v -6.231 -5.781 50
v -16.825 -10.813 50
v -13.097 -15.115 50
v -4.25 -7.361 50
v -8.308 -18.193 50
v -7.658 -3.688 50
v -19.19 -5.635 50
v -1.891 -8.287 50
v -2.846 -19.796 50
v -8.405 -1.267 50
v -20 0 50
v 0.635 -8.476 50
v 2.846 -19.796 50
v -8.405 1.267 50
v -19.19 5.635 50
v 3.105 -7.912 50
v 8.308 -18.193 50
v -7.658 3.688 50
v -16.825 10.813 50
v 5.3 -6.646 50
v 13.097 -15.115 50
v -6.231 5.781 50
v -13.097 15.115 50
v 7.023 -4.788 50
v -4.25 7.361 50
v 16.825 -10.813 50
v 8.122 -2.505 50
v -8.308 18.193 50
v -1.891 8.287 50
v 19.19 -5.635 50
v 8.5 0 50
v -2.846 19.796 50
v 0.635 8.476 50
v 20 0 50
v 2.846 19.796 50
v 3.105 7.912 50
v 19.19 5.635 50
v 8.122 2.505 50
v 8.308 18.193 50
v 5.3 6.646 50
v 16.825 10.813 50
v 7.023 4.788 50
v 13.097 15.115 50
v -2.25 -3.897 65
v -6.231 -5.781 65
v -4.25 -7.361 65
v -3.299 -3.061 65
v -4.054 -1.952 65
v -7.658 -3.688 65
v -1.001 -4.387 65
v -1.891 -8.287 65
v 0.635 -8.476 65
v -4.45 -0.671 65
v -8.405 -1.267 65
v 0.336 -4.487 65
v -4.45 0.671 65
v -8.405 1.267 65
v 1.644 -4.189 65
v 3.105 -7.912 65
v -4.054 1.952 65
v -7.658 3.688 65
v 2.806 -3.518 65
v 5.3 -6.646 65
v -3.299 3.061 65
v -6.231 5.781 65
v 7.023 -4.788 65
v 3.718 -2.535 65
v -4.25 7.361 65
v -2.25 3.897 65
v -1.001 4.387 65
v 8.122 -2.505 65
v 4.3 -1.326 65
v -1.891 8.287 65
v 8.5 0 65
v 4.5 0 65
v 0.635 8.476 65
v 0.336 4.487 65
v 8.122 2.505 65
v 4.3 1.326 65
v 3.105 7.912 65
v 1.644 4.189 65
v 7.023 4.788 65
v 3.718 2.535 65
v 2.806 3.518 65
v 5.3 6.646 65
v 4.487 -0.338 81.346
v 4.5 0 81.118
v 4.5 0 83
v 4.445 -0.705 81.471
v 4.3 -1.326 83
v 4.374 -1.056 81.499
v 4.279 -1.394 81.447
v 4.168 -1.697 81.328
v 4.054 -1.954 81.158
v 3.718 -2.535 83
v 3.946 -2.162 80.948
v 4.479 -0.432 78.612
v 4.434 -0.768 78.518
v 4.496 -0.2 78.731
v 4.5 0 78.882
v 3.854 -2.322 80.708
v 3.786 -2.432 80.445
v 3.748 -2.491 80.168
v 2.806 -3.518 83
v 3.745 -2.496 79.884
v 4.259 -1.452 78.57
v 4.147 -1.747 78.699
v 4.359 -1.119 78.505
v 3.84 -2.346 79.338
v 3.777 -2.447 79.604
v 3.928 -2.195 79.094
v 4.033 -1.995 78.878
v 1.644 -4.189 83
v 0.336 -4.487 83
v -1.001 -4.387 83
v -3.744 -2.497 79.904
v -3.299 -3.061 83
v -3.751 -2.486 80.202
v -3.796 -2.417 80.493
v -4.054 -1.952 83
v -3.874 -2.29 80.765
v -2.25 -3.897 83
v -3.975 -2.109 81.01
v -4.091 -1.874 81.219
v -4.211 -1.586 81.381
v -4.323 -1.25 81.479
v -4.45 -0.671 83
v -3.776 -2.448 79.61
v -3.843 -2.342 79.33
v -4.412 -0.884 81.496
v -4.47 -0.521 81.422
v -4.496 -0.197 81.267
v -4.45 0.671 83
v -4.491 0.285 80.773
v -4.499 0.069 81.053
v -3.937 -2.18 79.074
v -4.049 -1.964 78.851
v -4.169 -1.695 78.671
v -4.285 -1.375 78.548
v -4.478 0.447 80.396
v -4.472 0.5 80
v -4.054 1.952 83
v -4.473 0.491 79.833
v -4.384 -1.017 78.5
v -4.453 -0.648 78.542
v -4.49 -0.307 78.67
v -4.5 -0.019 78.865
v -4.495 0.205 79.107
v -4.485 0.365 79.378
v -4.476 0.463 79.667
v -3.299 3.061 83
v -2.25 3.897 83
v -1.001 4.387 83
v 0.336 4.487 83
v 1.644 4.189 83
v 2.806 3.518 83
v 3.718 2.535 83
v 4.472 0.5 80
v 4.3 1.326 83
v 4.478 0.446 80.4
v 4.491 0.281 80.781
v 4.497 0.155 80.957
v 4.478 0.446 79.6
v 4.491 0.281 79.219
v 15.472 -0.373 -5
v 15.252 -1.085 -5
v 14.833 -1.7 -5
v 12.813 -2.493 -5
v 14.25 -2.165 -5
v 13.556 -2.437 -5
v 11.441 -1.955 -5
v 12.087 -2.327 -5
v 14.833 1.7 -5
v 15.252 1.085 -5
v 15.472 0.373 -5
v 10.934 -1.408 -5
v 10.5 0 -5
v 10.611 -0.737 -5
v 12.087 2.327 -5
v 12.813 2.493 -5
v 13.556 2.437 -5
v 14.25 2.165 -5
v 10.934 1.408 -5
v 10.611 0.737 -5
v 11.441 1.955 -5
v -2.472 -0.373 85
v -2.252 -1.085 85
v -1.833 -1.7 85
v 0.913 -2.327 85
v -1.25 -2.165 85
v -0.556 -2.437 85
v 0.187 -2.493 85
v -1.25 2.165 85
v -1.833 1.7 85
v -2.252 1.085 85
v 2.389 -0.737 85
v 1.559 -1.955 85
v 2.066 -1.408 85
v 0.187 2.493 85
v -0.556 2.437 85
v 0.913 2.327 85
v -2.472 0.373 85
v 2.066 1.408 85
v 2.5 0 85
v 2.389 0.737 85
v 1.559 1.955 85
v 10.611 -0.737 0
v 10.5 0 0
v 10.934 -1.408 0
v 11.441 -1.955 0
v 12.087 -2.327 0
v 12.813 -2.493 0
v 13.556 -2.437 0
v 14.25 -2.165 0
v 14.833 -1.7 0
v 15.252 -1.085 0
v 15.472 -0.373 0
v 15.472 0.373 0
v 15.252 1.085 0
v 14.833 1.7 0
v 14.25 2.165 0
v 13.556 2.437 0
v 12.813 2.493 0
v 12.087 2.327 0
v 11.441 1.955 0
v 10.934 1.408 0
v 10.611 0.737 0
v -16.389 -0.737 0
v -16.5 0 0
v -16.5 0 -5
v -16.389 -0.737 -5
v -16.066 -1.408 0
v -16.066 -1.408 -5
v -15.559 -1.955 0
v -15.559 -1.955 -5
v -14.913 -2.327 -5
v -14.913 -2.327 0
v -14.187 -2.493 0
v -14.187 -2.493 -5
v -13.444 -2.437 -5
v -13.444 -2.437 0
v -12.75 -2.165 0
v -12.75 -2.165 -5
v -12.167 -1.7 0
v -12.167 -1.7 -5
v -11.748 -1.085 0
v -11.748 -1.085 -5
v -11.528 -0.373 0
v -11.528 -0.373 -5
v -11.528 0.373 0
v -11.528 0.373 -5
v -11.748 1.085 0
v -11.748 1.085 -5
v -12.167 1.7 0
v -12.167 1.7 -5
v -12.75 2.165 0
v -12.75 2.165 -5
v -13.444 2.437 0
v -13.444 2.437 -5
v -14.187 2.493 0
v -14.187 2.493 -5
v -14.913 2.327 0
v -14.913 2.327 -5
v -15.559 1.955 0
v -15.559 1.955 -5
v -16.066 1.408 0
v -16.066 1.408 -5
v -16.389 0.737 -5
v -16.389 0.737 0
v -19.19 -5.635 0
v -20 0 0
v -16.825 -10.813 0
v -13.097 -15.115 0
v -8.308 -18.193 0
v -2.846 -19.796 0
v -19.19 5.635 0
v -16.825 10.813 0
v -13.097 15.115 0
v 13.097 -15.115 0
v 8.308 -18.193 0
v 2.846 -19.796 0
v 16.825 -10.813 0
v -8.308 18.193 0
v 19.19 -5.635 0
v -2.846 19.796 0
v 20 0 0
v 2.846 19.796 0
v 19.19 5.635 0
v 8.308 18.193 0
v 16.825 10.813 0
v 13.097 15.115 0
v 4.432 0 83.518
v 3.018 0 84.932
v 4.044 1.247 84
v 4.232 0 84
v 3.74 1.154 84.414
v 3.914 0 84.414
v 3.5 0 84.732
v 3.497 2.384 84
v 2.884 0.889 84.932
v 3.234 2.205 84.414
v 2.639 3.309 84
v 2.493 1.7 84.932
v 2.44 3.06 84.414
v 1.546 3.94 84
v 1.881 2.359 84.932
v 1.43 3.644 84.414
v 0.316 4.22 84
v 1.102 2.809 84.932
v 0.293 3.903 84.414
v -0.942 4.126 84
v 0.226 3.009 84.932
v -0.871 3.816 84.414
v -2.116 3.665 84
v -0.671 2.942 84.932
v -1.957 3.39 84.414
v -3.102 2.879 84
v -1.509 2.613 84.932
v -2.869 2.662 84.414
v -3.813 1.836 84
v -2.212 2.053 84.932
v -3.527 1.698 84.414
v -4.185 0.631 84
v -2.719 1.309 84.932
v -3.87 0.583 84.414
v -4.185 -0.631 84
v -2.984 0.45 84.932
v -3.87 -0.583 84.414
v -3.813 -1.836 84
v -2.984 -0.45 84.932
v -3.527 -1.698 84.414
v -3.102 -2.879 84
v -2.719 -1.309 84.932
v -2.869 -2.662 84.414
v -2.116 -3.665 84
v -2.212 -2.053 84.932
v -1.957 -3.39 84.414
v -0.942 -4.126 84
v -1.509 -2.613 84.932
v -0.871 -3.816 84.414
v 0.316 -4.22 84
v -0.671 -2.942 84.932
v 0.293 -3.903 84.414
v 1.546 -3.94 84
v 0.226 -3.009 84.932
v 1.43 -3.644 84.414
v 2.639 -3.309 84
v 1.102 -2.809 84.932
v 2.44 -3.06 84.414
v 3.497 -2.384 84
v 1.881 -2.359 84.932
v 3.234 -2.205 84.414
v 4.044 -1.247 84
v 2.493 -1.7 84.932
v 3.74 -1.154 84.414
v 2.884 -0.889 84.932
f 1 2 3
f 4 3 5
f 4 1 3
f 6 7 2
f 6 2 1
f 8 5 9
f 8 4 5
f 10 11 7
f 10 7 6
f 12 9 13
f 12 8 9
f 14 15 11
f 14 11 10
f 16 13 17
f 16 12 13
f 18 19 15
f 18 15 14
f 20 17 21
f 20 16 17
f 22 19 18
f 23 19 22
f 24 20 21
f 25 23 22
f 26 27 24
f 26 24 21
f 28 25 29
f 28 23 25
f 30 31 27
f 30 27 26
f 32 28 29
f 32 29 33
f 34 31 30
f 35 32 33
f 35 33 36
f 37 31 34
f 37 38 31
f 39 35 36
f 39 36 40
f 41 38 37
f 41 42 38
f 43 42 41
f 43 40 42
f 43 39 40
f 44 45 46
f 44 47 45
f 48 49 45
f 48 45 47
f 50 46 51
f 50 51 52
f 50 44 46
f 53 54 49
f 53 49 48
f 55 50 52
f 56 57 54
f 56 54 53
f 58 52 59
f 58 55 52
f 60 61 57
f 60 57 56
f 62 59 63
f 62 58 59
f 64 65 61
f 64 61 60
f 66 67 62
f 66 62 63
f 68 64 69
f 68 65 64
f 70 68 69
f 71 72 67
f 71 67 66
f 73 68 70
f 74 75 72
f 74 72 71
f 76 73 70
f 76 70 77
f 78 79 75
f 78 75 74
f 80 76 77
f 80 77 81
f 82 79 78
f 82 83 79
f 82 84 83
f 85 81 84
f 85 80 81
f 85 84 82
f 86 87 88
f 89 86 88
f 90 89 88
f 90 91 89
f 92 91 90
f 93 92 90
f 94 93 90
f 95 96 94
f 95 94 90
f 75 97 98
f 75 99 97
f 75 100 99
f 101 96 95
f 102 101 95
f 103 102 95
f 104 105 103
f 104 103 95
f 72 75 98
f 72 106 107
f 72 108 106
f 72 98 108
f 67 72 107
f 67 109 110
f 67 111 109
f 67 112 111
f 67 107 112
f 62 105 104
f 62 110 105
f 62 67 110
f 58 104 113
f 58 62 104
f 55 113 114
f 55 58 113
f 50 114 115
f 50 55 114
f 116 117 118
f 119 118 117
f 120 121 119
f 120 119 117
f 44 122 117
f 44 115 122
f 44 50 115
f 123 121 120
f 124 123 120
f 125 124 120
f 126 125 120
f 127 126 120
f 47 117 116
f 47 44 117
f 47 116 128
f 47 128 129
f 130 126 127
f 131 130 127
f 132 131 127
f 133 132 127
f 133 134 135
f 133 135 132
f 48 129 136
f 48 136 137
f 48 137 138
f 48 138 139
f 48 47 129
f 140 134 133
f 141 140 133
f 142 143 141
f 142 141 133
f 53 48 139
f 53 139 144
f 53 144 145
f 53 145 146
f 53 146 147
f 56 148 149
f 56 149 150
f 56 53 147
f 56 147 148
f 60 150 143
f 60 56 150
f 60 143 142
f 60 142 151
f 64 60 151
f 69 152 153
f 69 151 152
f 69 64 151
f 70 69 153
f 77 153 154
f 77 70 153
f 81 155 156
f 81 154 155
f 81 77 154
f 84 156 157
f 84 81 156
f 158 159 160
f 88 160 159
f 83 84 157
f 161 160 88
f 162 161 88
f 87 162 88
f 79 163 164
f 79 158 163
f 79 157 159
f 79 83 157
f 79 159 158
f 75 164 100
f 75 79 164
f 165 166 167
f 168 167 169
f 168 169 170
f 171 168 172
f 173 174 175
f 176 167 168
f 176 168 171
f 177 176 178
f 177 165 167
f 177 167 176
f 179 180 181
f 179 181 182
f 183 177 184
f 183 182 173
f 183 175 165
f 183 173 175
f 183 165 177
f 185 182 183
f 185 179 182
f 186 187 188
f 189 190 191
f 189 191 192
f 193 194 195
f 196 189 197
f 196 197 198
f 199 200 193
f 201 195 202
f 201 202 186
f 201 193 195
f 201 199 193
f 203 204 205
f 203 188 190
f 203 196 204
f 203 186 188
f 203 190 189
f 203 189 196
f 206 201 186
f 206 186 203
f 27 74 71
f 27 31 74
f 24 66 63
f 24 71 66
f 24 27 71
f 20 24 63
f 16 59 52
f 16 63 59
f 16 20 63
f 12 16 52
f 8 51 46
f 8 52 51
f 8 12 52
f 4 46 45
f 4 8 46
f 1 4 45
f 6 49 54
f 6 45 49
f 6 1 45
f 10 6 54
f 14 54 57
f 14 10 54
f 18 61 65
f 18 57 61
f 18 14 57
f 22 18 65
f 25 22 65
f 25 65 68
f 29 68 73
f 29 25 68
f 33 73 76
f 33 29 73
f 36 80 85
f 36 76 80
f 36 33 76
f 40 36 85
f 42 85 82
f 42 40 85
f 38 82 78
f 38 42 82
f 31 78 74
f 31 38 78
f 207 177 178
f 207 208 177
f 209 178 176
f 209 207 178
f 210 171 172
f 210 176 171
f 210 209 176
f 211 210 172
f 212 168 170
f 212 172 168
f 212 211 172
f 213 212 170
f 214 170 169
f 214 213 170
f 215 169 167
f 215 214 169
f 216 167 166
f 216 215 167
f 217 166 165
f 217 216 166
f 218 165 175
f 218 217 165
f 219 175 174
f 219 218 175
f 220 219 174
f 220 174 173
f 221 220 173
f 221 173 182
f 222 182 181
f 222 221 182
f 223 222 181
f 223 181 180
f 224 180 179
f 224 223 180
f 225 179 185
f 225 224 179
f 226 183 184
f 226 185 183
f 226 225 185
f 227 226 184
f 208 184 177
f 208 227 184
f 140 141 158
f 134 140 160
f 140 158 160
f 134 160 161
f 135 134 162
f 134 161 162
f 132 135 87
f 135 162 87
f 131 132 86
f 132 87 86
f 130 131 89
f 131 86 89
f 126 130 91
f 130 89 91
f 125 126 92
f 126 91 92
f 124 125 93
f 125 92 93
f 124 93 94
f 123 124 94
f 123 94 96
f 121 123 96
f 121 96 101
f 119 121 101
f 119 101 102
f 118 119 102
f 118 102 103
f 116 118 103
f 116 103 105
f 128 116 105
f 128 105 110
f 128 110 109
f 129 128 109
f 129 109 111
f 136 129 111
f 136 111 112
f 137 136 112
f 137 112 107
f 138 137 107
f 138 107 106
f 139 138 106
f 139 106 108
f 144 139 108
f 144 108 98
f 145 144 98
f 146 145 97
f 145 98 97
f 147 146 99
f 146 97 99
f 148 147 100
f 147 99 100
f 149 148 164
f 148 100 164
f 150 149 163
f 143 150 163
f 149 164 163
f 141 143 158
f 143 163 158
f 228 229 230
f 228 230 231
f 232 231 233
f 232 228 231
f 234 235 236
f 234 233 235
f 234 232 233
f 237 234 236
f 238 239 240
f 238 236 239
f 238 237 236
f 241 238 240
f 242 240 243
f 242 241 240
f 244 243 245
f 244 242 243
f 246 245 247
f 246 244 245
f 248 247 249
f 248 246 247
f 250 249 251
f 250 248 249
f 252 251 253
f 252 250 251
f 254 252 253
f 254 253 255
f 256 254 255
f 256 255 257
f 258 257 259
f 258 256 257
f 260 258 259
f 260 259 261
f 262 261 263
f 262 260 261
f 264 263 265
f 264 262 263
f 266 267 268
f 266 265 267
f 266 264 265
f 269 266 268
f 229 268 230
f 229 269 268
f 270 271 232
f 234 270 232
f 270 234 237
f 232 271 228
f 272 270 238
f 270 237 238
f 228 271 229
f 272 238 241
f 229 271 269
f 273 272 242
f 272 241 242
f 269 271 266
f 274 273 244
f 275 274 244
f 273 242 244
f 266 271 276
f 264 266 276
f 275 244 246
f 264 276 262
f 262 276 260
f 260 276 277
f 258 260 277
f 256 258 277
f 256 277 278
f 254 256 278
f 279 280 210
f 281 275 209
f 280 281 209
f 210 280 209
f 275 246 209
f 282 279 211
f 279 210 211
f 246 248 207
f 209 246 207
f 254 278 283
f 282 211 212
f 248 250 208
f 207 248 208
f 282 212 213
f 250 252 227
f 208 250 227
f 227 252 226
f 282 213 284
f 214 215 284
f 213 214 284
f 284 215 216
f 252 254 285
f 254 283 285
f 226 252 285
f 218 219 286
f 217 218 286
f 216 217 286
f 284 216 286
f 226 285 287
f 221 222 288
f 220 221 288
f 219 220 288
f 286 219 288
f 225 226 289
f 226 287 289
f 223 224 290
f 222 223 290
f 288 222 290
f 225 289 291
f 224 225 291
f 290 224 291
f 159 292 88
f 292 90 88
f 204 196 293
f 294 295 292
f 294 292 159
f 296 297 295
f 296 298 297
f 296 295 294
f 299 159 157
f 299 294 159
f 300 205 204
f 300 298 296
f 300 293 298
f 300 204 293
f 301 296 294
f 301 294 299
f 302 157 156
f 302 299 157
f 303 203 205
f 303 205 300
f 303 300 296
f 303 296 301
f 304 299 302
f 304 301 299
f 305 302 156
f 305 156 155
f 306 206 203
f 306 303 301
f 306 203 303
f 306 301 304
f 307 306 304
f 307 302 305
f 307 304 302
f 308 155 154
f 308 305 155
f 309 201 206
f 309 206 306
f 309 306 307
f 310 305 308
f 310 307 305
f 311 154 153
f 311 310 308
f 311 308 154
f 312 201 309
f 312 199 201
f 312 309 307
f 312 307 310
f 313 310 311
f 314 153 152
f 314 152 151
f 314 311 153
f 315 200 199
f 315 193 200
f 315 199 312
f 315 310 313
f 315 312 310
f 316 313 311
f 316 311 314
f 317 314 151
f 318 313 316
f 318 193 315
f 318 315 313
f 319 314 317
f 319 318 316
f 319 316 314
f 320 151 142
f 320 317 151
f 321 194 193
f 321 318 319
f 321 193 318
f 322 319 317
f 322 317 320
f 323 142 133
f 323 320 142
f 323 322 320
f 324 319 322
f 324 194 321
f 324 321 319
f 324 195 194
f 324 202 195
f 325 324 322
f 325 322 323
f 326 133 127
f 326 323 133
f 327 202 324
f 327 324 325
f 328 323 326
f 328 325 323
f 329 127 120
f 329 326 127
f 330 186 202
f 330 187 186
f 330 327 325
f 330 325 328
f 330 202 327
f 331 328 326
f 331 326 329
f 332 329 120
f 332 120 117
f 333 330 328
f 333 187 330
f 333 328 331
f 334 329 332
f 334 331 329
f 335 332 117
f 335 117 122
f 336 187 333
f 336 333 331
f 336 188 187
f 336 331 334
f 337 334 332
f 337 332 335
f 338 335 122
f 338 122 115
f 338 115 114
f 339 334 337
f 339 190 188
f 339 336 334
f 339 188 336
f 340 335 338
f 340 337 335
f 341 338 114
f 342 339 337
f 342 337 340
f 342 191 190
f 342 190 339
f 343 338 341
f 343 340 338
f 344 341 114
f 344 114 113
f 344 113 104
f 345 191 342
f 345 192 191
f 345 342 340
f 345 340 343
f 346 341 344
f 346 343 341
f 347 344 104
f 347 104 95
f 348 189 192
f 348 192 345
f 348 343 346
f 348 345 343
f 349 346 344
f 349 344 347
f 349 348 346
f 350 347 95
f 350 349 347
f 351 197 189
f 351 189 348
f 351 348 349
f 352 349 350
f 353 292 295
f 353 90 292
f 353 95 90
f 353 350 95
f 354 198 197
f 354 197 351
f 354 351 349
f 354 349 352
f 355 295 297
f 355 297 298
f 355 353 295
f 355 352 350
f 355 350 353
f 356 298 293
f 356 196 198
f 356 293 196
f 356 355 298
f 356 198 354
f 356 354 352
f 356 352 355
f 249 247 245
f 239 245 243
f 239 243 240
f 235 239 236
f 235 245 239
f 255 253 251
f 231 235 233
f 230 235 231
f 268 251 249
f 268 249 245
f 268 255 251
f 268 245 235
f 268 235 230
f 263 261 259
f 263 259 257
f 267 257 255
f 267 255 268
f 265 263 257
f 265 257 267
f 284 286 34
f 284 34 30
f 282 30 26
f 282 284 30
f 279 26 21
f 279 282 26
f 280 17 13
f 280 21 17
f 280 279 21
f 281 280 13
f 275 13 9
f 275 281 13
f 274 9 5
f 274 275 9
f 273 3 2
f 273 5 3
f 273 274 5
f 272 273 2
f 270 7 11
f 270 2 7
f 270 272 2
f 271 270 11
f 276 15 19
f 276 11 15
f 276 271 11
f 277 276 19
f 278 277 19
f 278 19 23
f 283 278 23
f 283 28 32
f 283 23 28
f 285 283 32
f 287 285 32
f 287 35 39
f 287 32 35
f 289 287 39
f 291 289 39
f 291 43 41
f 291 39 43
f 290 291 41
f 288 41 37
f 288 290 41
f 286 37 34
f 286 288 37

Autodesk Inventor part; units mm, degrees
ref_plane "YZ Plane" through (0, 0, 0) normal (1, 0, 0) x (0, 1, 0)
ref_plane "XZ Plane" through (0, 0, 0) normal (0, 1, 0) x (-1, 0, 0)
ref_plane "XY Plane" through (0, 0, 0) normal (0, 0, 1) x (1, 0, 0)
sketch "Sketch1" plane through (0, 0, 0) normal (0, 0, 1) x (1, 0, 0)
  circle A0 centre (0, 0) radius 20
  dimension "d0" = 40
extrude "Extrusion1" add sketch "Sketch1" along normal blind 50
sketch "Sketch2" plane through (0, 0, 50) normal (0, 0, 1) x (1, 0, 0)
  circle A0 centre (0, 0) radius 8.5
  dimension "d3" = 17
extrude "Extrusion2" add sketch "Sketch2" along normal blind 15
thread "Thread1" size "M17x1.5" class "6g" standard "ANSI Metric M Profile" full length
sketch "Sketch3" plane through (0, 0, 65) normal (0, 0, 1) x (1, 0, 0)
  circle A0 centre (0, 0) radius 4.5
  dimension "d8" = 9
extrude "Extrusion3" add sketch "Sketch3" along normal blind 20
sketch "Sketch4" plane through (0, 0, 0) normal (1, 0, 0) x (0, 1, 0)
  line L0 (4.5, 85) -> (-4.5, 85) projected
  line L1 (0, 85) -> (0, 80)
  circle A0 centre (0, 80) radius 1
  circle A1 centre (-1, 80) radius 1.5
  point P0 (0, 0)
  dimension "d11" = 5
  dimension "d12" = 3
extrude "Extrusion4" cut sketch "Sketch4" along normal through all both and the other way through all contours A1 A0 L1 | L1 A0 A1 | A0 A1 picked at (0.0001, 79.7835)
fillet "Fillet1" radius 2 1 edges at (-4.5, 0, 85)
sketch "Sketch5" plane through (0, 0, 0) normal (0, 0, -1) x (-1, 0, 0)
  circle A0 centre (14, 0) radius 2.5
  circle A1 centre (-13, 0) radius 2.5
  point P0 (0, 0)
  dimension "d16" = 5
  dimension "d17" = 5
extrude "Extrusion5" add sketch "Sketch5" along normal blind 5
properties part number "dc motor for capping system"
